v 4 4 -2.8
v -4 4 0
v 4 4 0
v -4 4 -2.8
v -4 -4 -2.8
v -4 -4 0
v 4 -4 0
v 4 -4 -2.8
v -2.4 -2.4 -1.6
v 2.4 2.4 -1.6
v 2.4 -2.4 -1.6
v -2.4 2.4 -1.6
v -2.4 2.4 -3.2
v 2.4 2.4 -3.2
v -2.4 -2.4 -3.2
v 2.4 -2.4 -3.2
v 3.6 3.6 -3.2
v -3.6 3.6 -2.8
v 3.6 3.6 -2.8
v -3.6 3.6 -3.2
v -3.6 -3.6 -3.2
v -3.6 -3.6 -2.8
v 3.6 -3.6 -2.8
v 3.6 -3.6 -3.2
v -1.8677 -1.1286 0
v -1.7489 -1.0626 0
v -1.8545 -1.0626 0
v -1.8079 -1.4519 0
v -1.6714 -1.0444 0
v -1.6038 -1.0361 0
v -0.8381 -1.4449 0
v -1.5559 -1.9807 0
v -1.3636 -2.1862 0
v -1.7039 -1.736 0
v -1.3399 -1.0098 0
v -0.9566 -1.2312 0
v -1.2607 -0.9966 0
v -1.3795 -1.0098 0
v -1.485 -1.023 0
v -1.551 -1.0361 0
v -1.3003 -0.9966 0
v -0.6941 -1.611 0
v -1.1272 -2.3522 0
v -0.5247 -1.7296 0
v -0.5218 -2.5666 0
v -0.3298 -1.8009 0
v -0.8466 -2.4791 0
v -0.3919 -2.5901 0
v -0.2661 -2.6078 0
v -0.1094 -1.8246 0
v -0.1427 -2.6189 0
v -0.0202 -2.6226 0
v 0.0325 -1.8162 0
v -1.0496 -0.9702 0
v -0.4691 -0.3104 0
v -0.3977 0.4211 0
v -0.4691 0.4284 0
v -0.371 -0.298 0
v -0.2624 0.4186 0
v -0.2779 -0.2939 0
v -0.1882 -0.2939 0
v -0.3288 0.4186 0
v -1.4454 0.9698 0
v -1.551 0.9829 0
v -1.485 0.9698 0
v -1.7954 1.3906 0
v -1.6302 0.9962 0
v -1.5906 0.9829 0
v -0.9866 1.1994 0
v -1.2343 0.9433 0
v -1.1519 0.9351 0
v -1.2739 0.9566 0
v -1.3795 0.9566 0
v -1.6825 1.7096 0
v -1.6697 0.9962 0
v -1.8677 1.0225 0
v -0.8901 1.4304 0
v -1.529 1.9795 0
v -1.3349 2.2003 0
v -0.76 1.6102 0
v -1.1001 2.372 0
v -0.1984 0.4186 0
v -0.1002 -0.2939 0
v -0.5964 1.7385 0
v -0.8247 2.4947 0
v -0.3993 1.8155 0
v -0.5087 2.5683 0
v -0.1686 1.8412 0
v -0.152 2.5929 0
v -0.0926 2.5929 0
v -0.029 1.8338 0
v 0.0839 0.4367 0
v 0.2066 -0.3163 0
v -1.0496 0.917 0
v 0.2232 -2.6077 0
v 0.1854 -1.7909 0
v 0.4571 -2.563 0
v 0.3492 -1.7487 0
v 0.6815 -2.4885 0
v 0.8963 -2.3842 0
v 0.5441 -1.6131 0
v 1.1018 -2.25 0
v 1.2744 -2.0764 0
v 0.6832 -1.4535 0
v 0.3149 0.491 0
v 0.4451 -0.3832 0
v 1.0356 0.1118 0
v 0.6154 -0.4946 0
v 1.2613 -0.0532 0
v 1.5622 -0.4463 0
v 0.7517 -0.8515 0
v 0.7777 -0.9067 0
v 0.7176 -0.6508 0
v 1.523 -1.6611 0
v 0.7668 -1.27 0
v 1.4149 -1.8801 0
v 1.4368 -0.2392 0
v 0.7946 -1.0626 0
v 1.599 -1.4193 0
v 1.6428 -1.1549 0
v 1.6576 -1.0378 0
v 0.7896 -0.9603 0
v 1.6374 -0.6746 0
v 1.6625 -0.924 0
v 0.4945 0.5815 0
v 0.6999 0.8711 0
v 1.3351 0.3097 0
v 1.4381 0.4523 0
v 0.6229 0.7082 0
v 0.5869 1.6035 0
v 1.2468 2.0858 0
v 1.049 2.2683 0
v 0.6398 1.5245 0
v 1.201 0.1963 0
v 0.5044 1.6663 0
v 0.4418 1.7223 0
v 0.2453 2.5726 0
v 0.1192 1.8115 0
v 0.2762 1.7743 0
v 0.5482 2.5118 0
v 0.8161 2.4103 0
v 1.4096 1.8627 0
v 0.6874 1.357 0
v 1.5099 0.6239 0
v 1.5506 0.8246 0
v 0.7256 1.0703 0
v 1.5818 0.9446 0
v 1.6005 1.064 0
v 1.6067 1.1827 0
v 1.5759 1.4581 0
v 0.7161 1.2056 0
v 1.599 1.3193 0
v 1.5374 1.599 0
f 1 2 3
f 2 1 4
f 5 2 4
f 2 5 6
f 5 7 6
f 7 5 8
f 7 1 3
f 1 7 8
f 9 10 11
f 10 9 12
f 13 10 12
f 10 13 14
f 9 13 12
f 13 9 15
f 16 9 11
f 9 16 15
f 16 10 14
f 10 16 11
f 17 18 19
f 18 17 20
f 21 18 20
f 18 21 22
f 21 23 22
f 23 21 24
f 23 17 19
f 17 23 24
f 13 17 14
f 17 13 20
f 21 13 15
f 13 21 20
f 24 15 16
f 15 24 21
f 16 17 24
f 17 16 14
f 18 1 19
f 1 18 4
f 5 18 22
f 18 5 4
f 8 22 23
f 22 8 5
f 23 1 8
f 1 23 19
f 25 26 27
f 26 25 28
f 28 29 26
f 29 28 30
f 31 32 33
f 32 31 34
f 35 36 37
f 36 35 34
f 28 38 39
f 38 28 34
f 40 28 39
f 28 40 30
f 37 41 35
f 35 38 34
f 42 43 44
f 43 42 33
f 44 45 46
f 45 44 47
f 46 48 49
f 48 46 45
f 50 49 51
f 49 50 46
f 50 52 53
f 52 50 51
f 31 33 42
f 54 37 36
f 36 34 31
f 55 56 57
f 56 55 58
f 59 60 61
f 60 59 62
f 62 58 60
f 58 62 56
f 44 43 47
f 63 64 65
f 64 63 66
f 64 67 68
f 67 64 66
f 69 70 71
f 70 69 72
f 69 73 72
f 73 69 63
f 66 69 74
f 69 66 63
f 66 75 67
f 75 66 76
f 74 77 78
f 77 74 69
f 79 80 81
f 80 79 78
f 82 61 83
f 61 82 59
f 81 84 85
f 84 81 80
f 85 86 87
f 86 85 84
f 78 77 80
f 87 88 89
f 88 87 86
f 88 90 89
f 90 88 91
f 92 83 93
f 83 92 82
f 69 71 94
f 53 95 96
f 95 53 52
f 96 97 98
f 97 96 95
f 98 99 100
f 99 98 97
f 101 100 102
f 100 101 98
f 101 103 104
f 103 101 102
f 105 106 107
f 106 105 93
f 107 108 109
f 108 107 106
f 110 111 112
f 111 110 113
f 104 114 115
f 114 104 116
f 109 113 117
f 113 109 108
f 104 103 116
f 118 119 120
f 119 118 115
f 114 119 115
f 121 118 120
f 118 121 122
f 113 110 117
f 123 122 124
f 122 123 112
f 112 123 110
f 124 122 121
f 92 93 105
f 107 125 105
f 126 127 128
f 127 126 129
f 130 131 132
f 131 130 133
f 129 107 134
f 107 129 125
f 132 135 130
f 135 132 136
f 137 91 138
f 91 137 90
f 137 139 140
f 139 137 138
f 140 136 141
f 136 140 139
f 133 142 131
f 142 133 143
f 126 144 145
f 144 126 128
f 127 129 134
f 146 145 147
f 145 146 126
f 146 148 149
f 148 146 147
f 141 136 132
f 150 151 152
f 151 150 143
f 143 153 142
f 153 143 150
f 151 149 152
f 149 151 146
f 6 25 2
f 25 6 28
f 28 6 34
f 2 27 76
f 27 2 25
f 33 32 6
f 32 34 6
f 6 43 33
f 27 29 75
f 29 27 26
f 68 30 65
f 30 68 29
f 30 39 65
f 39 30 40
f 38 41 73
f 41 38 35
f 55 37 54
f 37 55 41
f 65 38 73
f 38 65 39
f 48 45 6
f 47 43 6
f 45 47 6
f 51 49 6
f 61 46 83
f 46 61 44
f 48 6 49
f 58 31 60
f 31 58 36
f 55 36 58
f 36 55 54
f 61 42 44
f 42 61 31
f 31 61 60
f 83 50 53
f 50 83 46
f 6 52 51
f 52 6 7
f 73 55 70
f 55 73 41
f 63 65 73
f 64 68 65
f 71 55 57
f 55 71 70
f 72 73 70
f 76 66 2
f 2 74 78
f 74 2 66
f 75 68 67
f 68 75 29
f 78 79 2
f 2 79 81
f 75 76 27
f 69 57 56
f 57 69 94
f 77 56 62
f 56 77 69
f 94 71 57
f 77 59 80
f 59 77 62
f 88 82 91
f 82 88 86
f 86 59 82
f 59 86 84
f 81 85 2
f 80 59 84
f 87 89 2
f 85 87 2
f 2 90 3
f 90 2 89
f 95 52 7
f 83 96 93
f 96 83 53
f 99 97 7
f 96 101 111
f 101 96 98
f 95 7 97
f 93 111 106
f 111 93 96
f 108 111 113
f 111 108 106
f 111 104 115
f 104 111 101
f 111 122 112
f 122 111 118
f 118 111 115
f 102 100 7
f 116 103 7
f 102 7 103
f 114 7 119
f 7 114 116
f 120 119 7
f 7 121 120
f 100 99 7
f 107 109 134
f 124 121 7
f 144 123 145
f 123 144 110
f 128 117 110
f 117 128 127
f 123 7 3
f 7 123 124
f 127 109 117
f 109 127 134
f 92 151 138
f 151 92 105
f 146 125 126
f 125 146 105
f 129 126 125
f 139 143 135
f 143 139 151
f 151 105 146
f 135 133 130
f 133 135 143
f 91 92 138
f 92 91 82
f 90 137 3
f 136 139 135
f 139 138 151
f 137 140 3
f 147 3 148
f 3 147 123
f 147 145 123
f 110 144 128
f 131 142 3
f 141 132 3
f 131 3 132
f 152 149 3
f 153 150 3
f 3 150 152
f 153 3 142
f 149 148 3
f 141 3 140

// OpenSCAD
// file: ../p/box5.scad
use <../lib.scad>
function ldraw_lib__box5() = [
// 0 Box with 5 Faces and All Edges
// 0 Name: box5.dat
// 0 Author: James Jessiman
// 0 !LDRAW_ORG Primitive UPDATE 2012-01
// 0 !LICENSE Licensed under CC BY 2.0 and CC BY 4.0 : see CAreadme.txt
// 
// 0 BFC CERTIFY CCW
  [0,"BFC","CERTIFY"],
  [0,"BFC","CCW"],
// 
// 0 !HISTORY 2002-04-03 [sbliss] Modified for BFC compliance
// 0 !HISTORY 2002-04-25 [PTadmin] Official Update 2002-02
// 0 !HISTORY 2007-06-24 [PTadmin] Header formatted for Contributor Agreement
// 0 !HISTORY 2008-07-01 [PTadmin] Official Update 2008-01
// 0 !HISTORY 2012-02-16 [Philo] Changed to CCW
// 0 !HISTORY 2012-03-30 [PTadmin] Official Update 2012-01
// 
// 
// 2 24 1 1 1 -1 1 1
  [2,24,1,1,1,-1,1,1],
// 2 24 -1 1 1 -1 1 -1
  [2,24,-1,1,1,-1,1,-1],
// 2 24 -1 1 -1 1 1 -1
  [2,24,-1,1,-1,1,1,-1],
// 2 24 1 1 -1 1 1 1
  [2,24,1,1,-1,1,1,1],
// 2 24 1 0 1 -1 0 1
  [2,24,1,0,1,-1,0,1],
// 2 24 -1 0 1 -1 0 -1
  [2,24,-1,0,1,-1,0,-1],
// 2 24 -1 0 -1 1 0 -1
  [2,24,-1,0,-1,1,0,-1],
// 2 24 1 0 -1 1 0 1
  [2,24,1,0,-1,1,0,1],
// 2 24 1 0 1 1 1 1
  [2,24,1,0,1,1,1,1],
// 2 24 -1 0 1 -1 1 1
  [2,24,-1,0,1,-1,1,1],
// 2 24 1 0 -1 1 1 -1
  [2,24,1,0,-1,1,1,-1],
// 2 24 -1 0 -1 -1 1 -1
  [2,24,-1,0,-1,-1,1,-1],
// 4 16 -1 1 1 1 1 1 1 1 -1 -1 1 -1
  [4,16,-1,1,1,1,1,1,1,1,-1,-1,1,-1],
// 4 16 -1 1 1 -1 0 1 1 0 1 1 1 1
  [4,16,-1,1,1,-1,0,1,1,0,1,1,1,1],
// 4 16 -1 1 -1 -1 0 -1 -1 0 1 -1 1 1
  [4,16,-1,1,-1,-1,0,-1,-1,0,1,-1,1,1],
// 4 16 1 1 -1 1 0 -1 -1 0 -1 -1 1 -1
  [4,16,1,1,-1,1,0,-1,-1,0,-1,-1,1,-1],
// 4 16 1 1 1 1 0 1 1 0 -1 1 1 -1
  [4,16,1,1,1,1,0,1,1,0,-1,1,1,-1],
];
makepoly(ldraw_lib__box5(), line=0.2);
// file: ../p/box4.scad
use <../lib.scad>
function ldraw_lib__box4() = [
// 0 Box with 4 Faces (2 Parallel Pairs) and All Edges
// 0 Name: box4.dat
// 0 Author: James Jessiman
// 0 !LDRAW_ORG Primitive UPDATE 2012-01
// 0 !LICENSE Licensed under CC BY 2.0 and CC BY 4.0 : see CAreadme.txt
// 
// 0 BFC CERTIFY CCW
  [0,"BFC","CERTIFY"],
  [0,"BFC","CCW"],
// 
// 0 !HISTORY 2002-04-03 [sbliss] Modified for BFC compliance
// 0 !HISTORY 2002-04-25 [PTadmin] Official Update 2002-02
// 0 !HISTORY 2007-06-24 [PTadmin] Header formatted for Contributor Agreement
// 0 !HISTORY 2008-07-01 [PTadmin] Official Update 2008-01
// 0 !HISTORY 2012-02-16 [Philo] Changed to CCW
// 0 !HISTORY 2012-03-30 [PTadmin] Official Update 2012-01
// 
// 
// 2 24 1 1 1 -1 1 1
  [2,24,1,1,1,-1,1,1],
// 2 24 -1 1 1 -1 1 -1
  [2,24,-1,1,1,-1,1,-1],
// 2 24 -1 1 -1 1 1 -1
  [2,24,-1,1,-1,1,1,-1],
// 2 24 1 1 -1 1 1 1
  [2,24,1,1,-1,1,1,1],
// 2 24 1 0 1 -1 0 1
  [2,24,1,0,1,-1,0,1],
// 2 24 -1 0 1 -1 0 -1
  [2,24,-1,0,1,-1,0,-1],
// 2 24 -1 0 -1 1 0 -1
  [2,24,-1,0,-1,1,0,-1],
// 2 24 1 0 -1 1 0 1
  [2,24,1,0,-1,1,0,1],
// 2 24 1 0 1 1 1 1
  [2,24,1,0,1,1,1,1],
// 2 24 -1 0 1 -1 1 1
  [2,24,-1,0,1,-1,1,1],
// 2 24 1 0 -1 1 1 -1
  [2,24,1,0,-1,1,1,-1],
// 2 24 -1 0 -1 -1 1 -1
  [2,24,-1,0,-1,-1,1,-1],
// 4 16 -1 1 1 -1 0 1 1 0 1 1 1 1
  [4,16,-1,1,1,-1,0,1,1,0,1,1,1,1],
// 4 16 -1 1 -1 -1 0 -1 -1 0 1 -1 1 1
  [4,16,-1,1,-1,-1,0,-1,-1,0,1,-1,1,1],
// 4 16 1 1 -1 1 0 -1 -1 0 -1 -1 1 -1
  [4,16,1,1,-1,1,0,-1,-1,0,-1,-1,1,-1],
// 4 16 1 1 1 1 0 1 1 0 -1 1 1 -1
  [4,16,1,1,1,1,0,1,1,0,-1,1,1,-1],
];
makepoly(ldraw_lib__box4(), line=0.2);
// file: s/3070bs01.scad
use <../../lib.scad>
use <../../p/box4.scad>
use <../../p/box5.scad>
function ldraw_lib__s__3070bs01() = [
// 0 ~Tile  1 x  1 with Groove without Top Face
// 0 Name: s\3070bs01.dat
// 0 Author: Chris Dee [cwdee]
// 0 !LDRAW_ORG Subpart UPDATE 2009-02
// 0 !LICENSE Licensed under CC BY 2.0 and CC BY 4.0 : see CAreadme.txt
// 
// 0 BFC CERTIFY CCW
  [0,"BFC","CERTIFY"],
  [0,"BFC","CCW"],
// 
// 0 !HISTORY 2009-09-03 [PTadmin] Official Update 2009-02
// 
// 
// 1 16 0 0 0 10 0 0 0 7 0 0 0 10 box4.dat
  [1,16,0,0,0,10,0,0,0,7,0,0,0,10, ldraw_lib__box4()],
// 0 BFC INVERTNEXT
  [0,"BFC","INVERTNEXT"],
// 1 16 0 8 0 6 0 0 0 -4 0 0 0 6 box5.dat
  [1,16,0,8,0,6,0,0,0,-4,0,0,0,6, ldraw_lib__box5()],
// 1 16 0 7 0 9 0 0 0 1 0 0 0 9 box4.dat
  [1,16,0,7,0,9,0,0,0,1,0,0,0,9, ldraw_lib__box4()],
// 
// 4 16 9 8 9 6 8 6 -6 8 6 -9 8 9
  [4,16,9,8,9,6,8,6,-6,8,6,-9,8,9],
// 4 16 -9 8 9 -6 8 6 -6 8 -6 -9 8 -9
  [4,16,-9,8,9,-6,8,6,-6,8,-6,-9,8,-9],
// 4 16 -9 8 -9 -6 8 -6 6 8 -6 9 8 -9
  [4,16,-9,8,-9,-6,8,-6,6,8,-6,9,8,-9],
// 4 16 9 8 -9 6 8 -6 6 8 6 9 8 9
  [4,16,9,8,-9,6,8,-6,6,8,6,9,8,9],
// 
// 4 16 10 7 10 9 7 9 -9 7 9 -10 7 10
  [4,16,10,7,10,9,7,9,-9,7,9,-10,7,10],
// 4 16 -10 7 10 -9 7 9 -9 7 -9 -10 7 -10
  [4,16,-10,7,10,-9,7,9,-9,7,-9,-10,7,-10],
// 4 16 -10 7 -10 -9 7 -9 9 7 -9 10 7 -10
  [4,16,-10,7,-10,-9,7,-9,9,7,-9,10,7,-10],
// 4 16 10 7 -10 9 7 -9 9 7 9 10 7 10
  [4,16,10,7,-10,9,7,-9,9,7,9,10,7,10],
// 0
];
makepoly(ldraw_lib__s__3070bs01(), line=0.2);
// main file
use <../lib.scad>
use <s/3070bs01.scad>
function ldraw_lib__3070bp03() = [
// 0 Tile  1 x  1 with Black "3" Pattern
// 0 Name: 3070bp03.dat
// 0 Author: John Riley [jriley]
// 0 !LDRAW_ORG Part UPDATE 2009-03
// 0 !LICENSE Licensed under CC BY 2.0 and CC BY 4.0 : see CAreadme.txt
// 
// 0 BFC CERTIFY CCW
  [0,"BFC","CERTIFY"],
  [0,"BFC","CCW"],
// 
// 0 !HISTORY 2004-03-02 [PTadmin] Official Update 2004-01
// 0 !HISTORY 2007-10-13 [PTadmin] Header formatted for Contributor Agreement
// 0 !HISTORY 2008-07-01 [PTadmin] Official Update 2008-01
// 0 !HISTORY 2009-08-12 [anathema] Improved pattern
// 0 !HISTORY 2009-12-29 [PTadmin] Official Update 2009-03
// 
// 
// 1 16 0 0 0 1 0 0 0 1 0 0 0 1 s\3070bs01.dat
  [1,16,0,0,0,1,0,0,0,1,0,0,0,1, ldraw_lib__s__3070bs01()],
// 4 0 -4.66925 0 -2.82141 -4.51972 0 -3.62986 -4.37228 0 -2.65649 -4.63619 0 -2.65649
  [4,0,-4.66925,0,-2.82141,-4.51972,0,-3.62986,-4.37228,0,-2.65649,-4.63619,0,-2.65649],
// 4 0 -4.17848 0 -2.61108 -4.37228 0 -2.65649 -4.51972 0 -3.62986 -4.00938 0 -2.59037
  [4,0,-4.17848,0,-2.61108,-4.37228,0,-2.65649,-4.51972,0,-3.62986,-4.00938,0,-2.59037],
// 4 0 -2.09532 0 -3.61219 -4.2598 0 -4.33989 -3.88968 0 -4.95169 -3.40898 0 -5.46545
  [4,0,-2.09532,0,-3.61219,-4.2598,0,-4.33989,-3.88968,0,-4.95169,-3.40898,0,-5.46545],
// 4 0 -3.3497 0 -2.52444 -4.2598 0 -4.33989 -2.39153 0 -3.0781 -3.15172 0 -2.49138
  [4,0,-3.3497,0,-2.52444,-4.2598,0,-4.33989,-2.39153,0,-3.0781,-3.15172,0,-2.49138],
// 4 0 -4.51972 0 -3.62986 -4.2598 0 -4.33989 -3.44869 0 -2.52444 -3.7126 0 -2.5575
  [4,0,-4.51972,0,-3.62986,-4.2598,0,-4.33989,-3.44869,0,-2.52444,-3.7126,0,-2.5575],
// 3 0 -3.87752 0 -2.59037 -4.51972 0 -3.62986 -3.7126 0 -2.5575
  [3,0,-3.87752,0,-2.59037,-4.51972,0,-3.62986,-3.7126,0,-2.5575],
// 3 0 -4.51972 0 -3.62986 -3.87752 0 -2.59037 -4.00938 0 -2.59037
  [3,0,-4.51972,0,-3.62986,-3.87752,0,-2.59037,-4.00938,0,-2.59037],
// 3 0 -3.15172 0 -2.49138 -3.25071 0 -2.49138 -3.3497 0 -2.52444
  [3,0,-3.15172,0,-2.49138,-3.25071,0,-2.49138,-3.3497,0,-2.52444],
// 3 0 -3.3497 0 -2.52444 -3.44869 0 -2.52444 -4.2598 0 -4.33989
  [3,0,-3.3497,0,-2.52444,-3.44869,0,-2.52444,-4.2598,0,-4.33989],
// 4 0 -1.73527 0 -4.02753 -3.40898 0 -5.46545 -2.81789 0 -5.8806 -1.31176 0 -4.32412
  [4,0,-1.73527,0,-4.02753,-3.40898,0,-5.46545,-2.81789,0,-5.8806,-1.31176,0,-4.32412],
// 4 0 -1.30454 0 -6.4164 -0.82441 0 -4.50215 -1.31176 0 -4.32412 -2.11641 0 -6.19771
  [4,0,-1.30454,0,-6.4164,-0.82441,0,-4.50215,-1.31176,0,-4.32412,-2.11641,0,-6.19771],
// 4 0 -0.82441 0 -4.50215 -1.30454 0 -6.4164 -0.97964 0 -6.4753 -0.66519 0 -6.51957
  [4,0,-0.82441,0,-4.50215,-1.30454,0,-6.4164,-0.97964,0,-6.4753,-0.66519,0,-6.51957],
// 4 0 -0.66519 0 -6.51957 -0.35682 0 -6.54731 -0.27341 0 -4.56162 -0.82441 0 -4.50215
  [4,0,-0.66519,0,-6.51957,-0.35682,0,-6.54731,-0.27341,0,-4.56162,-0.82441,0,-4.50215],
// 4 0 -0.27341 0 -4.56162 -0.35682 0 -6.54731 -0.05054 0 -6.55662 0.08132 0 -4.54053
  [4,0,-0.27341,0,-4.56162,-0.35682,0,-6.54731,-0.05054,0,-6.55662,0.08132,0,-4.54053],
// 3 0 -2.09532 0 -3.61219 -3.40898 0 -5.46545 -1.73527 0 -4.02753
  [3,0,-2.09532,0,-3.61219,-3.40898,0,-5.46545,-1.73527,0,-4.02753],
// 3 0 -2.6239 0 -2.42545 -3.15172 0 -2.49138 -2.39153 0 -3.0781
  [3,0,-2.6239,0,-2.42545,-3.15172,0,-2.49138,-2.39153,0,-3.0781],
// 3 0 -2.39153 0 -3.0781 -4.2598 0 -4.33989 -2.09532 0 -3.61219
  [3,0,-2.39153,0,-3.0781,-4.2598,0,-4.33989,-2.09532,0,-3.61219],
// 4 0 -1.17268 0 -0.77606 -0.92739 0 -0.74509 -0.99427 0 1.05269 -1.17268 0 1.07112
  [4,0,-1.17268,0,-0.77606,-0.92739,0,-0.74509,-0.99427,0,1.05269,-1.17268,0,1.07112],
// 4 0 -0.69464 0 -0.73483 -0.47044 0 -0.73483 -0.65607 0 1.04642 -0.82194 0 1.04642
  [4,0,-0.69464,0,-0.73483,-0.47044,0,-0.73483,-0.65607,0,1.04642,-0.82194,0,1.04642],
// 4 0 -0.92739 0 -0.74509 -0.69464 0 -0.73483 -0.82194 0 1.04642 -0.99427 0 1.05269
  [4,0,-0.92739,0,-0.74509,-0.69464,0,-0.73483,-0.82194,0,1.04642,-0.99427,0,1.05269],
// 3 0 -1.31176 0 -4.32412 -2.81789 0 -5.8806 -2.11641 0 -6.19771
  [3,0,-1.31176,0,-4.32412,-2.81789,0,-5.8806,-2.11641,0,-6.19771],
// 4 0 -3.87752 0 2.45736 -3.7126 0 2.42449 -3.61361 0 2.42449 -4.48856 0 3.47652
  [4,0,-3.87752,0,2.45736,-3.7126,0,2.42449,-3.61361,0,2.42449,-4.48856,0,3.47652],
// 4 0 -4.0755 0 2.49042 -3.97651 0 2.45736 -3.87752 0 2.45736 -4.48856 0 3.47652
  [4,0,-4.0755,0,2.49042,-3.97651,0,2.45736,-3.87752,0,2.45736,-4.48856,0,3.47652],
// 4 0 -2.46658 0 2.99848 -3.18478 0 2.39143 -3.08579 0 2.35837 -2.87964 0 2.33785
  [4,0,-2.46658,0,2.99848,-3.18478,0,2.39143,-3.08579,0,2.35837,-2.87964,0,2.33785],
// 4 0 -2.46658 0 2.99848 -3.61361 0 2.42449 -3.44869 0 2.39143 -3.18478 0 2.39143
  [4,0,-2.46658,0,2.99848,-3.61361,0,2.42449,-3.44869,0,2.39143,-3.18478,0,2.39143],
// 4 0 -4.48856 0 3.47652 -3.61361 0 2.42449 -2.46658 0 2.99848 -4.20622 0 4.27395
  [4,0,-4.48856,0,3.47652,-3.61361,0,2.42449,-2.46658,0,2.99848,-4.20622,0,4.27395],
// 4 0 -4.48856 0 3.47652 -4.66925 0 2.55635 -4.1743 0 2.49042 -4.0755 0 2.49042
  [4,0,-4.48856,0,3.47652,-4.66925,0,2.55635,-4.1743,0,2.49042,-4.0755,0,2.49042],
// 4 0 -2.22528 0 3.57608 -3.82242 0 4.94864 -4.20622 0 4.27395 -2.46658 0 2.99848
  [4,0,-2.22528,0,3.57608,-3.82242,0,4.94864,-4.20622,0,4.27395,-2.46658,0,2.99848],
// 4 0 -3.33716 0 5.50078 -3.82242 0 4.94864 -1.9 0 4.02543 -2.75025 0 5.92999
  [4,0,-3.33716,0,5.50078,-3.82242,0,4.94864,-1.9,0,4.02543,-2.75025,0,5.92999],
// 4 0 -0.49609 0 1.04642 -0.65607 0 1.04642 -0.47044 0 -0.73483 -0.25042 0 -0.73483
  [4,0,-0.49609,0,1.04642,-0.65607,0,1.04642,-0.47044,0,-0.73483,-0.25042,0,-0.73483],
// 4 0 -2.75025 0 5.92999 -1.9 0 4.02543 -1.49112 0 4.34634 -2.06169 0 6.23684
  [4,0,-2.75025,0,5.92999,-1.9,0,4.02543,-1.49112,0,4.34634,-2.06169,0,6.23684],
// 4 0 -2.06169 0 6.23684 -1.49112 0 4.34634 -0.99826 0 4.53881 -1.27167 0 6.42076
  [4,0,-2.06169,0,6.23684,-1.49112,0,4.34634,-0.99826,0,4.53881,-1.27167,0,6.42076],
// 3 0 -3.82242 0 4.94864 -2.22528 0 3.57608 -1.9 0 4.02543
  [3,0,-3.82242,0,4.94864,-2.22528,0,3.57608,-1.9,0,4.02543],
// 4 0 -1.27167 0 6.42076 -0.99826 0 4.53881 -0.42161 0 4.60303 -0.38 0 6.48213
  [4,0,-1.27167,0,6.42076,-0.99826,0,4.53881,-0.42161,0,4.60303,-0.38,0,6.48213],
// 4 0 -0.23142 0 6.48213 -0.38 0 6.48213 -0.42161 0 4.60303 -0.07258 0 4.58441
  [4,0,-0.23142,0,6.48213,-0.38,0,6.48213,-0.42161,0,4.60303,-0.07258,0,4.58441],
// 4 0 0.20976 0 1.09164 -0.49609 0 1.04642 -0.25042 0 -0.73483 0.51642 0 -0.79069
  [4,0,0.20976,0,1.09164,-0.49609,0,1.04642,-0.25042,0,-0.73483,0.51642,0,-0.79069],
// 3 0 -2.46658 0 2.99848 -2.87964 0 2.33785 -2.6239 0 2.29244
  [3,0,-2.46658,0,2.99848,-2.87964,0,2.33785,-2.6239,0,2.29244],
// 4 0 0.08132 0 -4.54053 -0.05054 0 -6.55662 0.55803 0 -6.51919 0.46341 0 -4.47726
  [4,0,0.08132,0,-4.54053,-0.05054,0,-6.55662,0.55803,0,-6.51919,0.46341,0,-4.47726],
// 4 0 0.46341 0 -4.47726 0.55803 0 -6.51919 1.14266 0 -6.40747 0.87305 0 -4.37181
  [4,0,0.46341,0,-4.47726,0.55803,0,-6.51919,1.14266,0,-6.40747,0.87305,0,-4.37181],
// 4 0 0.87305 0 -4.37181 1.14266 0 -6.40747 1.70373 0 -6.22127 2.24086 0 -5.9604
  [4,0,0.87305,0,-4.37181,1.14266,0,-6.40747,1.70373,0,-6.22127,2.24086,0,-5.9604],
// 4 0 1.36021 0 -4.03285 0.87305 0 -4.37181 2.24086 0 -5.9604 2.75443 0 -5.62505
  [4,0,1.36021,0,-4.03285,0.87305,0,-4.37181,2.24086,0,-5.9604,2.75443,0,-5.62505],
// 4 0 3.18611 0 -5.19109 1.7081 0 -3.63385 1.36021 0 -4.03285 2.75443 0 -5.62505
  [4,0,3.18611,0,-5.19109,1.7081,0,-3.63385,1.36021,0,-4.03285,2.75443,0,-5.62505],
// 4 0 0.78717 0 1.22749 0.51642 0 -0.79069 1.11264 0 -0.95789 2.58894 0 0.27939
  [4,0,0.78717,0,1.22749,0.51642,0,-0.79069,1.11264,0,-0.95789,2.58894,0,0.27939],
// 4 0 2.58894 0 0.27939 1.11264 0 -0.95789 1.53843 0 -1.23662 3.15324 0 -0.13291
  [4,0,2.58894,0,0.27939,1.11264,0,-0.95789,1.53843,0,-1.23662,3.15324,0,-0.13291],
// 4 0 3.90545 0 -1.11578 1.79398 0 -1.62688 1.87929 0 -2.12867 1.94427 0 -2.2668
  [4,0,3.90545,0,-1.11578,1.79398,0,-1.62688,1.87929,0,-2.12867,1.94427,0,-2.2668],
// 4 0 3.8076 0 -4.15274 1.91691 0 -3.175 1.7081 0 -3.63385 3.53723 0 -4.70032
  [4,0,3.8076,0,-4.15274,1.91691,0,-3.175,1.7081,0,-3.63385,3.53723,0,-4.70032],
// 4 0 3.15324 0 -0.13291 1.53843 0 -1.23662 1.79398 0 -1.62688 3.59195 0 -0.59803
  [4,0,3.15324,0,-0.13291,1.53843,0,-1.23662,1.79398,0,-1.62688,3.59195,0,-0.59803],
// 3 0 1.7081 0 -3.63385 3.18611 0 -5.19109 3.53723 0 -4.70032
  [3,0,1.7081,0,-3.63385,3.18611,0,-5.19109,3.53723,0,-4.70032],
// 4 0 1.98645 0 -2.65649 1.91691 0 -3.175 3.9976 0 -3.54835 4.10704 0 -2.88734
  [4,0,1.98645,0,-2.65649,1.91691,0,-3.175,3.9976,0,-3.54835,4.10704,0,-2.88734],
// 3 0 3.8076 0 -4.15274 3.9976 0 -3.54835 1.91691 0 -3.175
  [3,0,3.8076,0,-4.15274,3.9976,0,-3.54835,1.91691,0,-3.175],
// 4 0 1.98645 0 -2.65649 4.10704 0 -2.88734 4.1439 0 -2.59455 1.9741 0 -2.40075
  [4,0,1.98645,0,-2.65649,4.10704,0,-2.88734,4.1439,0,-2.59455,1.9741,0,-2.40075],
// 3 0 1.79398 0 -1.62688 3.90545 0 -1.11578 3.59195 0 -0.59803
  [3,0,1.79398,0,-1.62688,3.90545,0,-1.11578,3.59195,0,-0.59803],
// 4 0 4.09355 0 -1.68654 1.94427 0 -2.2668 1.9741 0 -2.40075 4.15625 0 -2.31012
  [4,0,4.09355,0,-1.68654,1.94427,0,-2.2668,1.9741,0,-2.40075,4.15625,0,-2.31012],
// 3 0 1.94427 0 -2.2668 4.09355 0 -1.68654 3.90545 0 -1.11578
  [3,0,1.94427,0,-2.2668,4.09355,0,-1.68654,3.90545,0,-1.11578],
// 3 0 4.15625 0 -2.31012 1.9741 0 -2.40075 4.1439 0 -2.59455
  [3,0,4.15625,0,-2.31012,1.9741,0,-2.40075,4.1439,0,-2.59455],
// 3 0 0.20976 0 1.09164 0.51642 0 -0.79069 0.78717 0 1.22749
  [3,0,0.20976,0,1.09164,0.51642,0,-0.79069,0.78717,0,1.22749],
// 3 0 2.58894 0 0.27939 1.23633 0 1.45378 0.78717 0 1.22749
  [3,0,2.58894,0,0.27939,1.23633,0,1.45378,0.78717,0,1.22749],
// 4 0 1.74971 0 2.17787 1.55724 0 1.77051 3.33773 0 0.77434 3.59518 0 1.13078
  [4,0,1.74971,0,2.17787,1.55724,0,1.77051,3.33773,0,0.77434,3.59518,0,1.13078],
// 4 0 1.46737 0 4.00871 1.59942 0 3.8113 3.11695 0 5.21445 2.62238 0 5.67083
  [4,0,1.46737,0,4.00871,1.59942,0,3.8113,3.11695,0,5.21445,2.62238,0,5.67083],
// 4 0 1.55724 0 1.77051 1.23633 0 1.45378 2.58894 0 0.27939 3.00238 0 0.49067
  [4,0,1.55724,0,1.77051,1.23633,0,1.45378,2.58894,0,0.27939,3.00238,0,0.49067],
// 4 0 1.26103 0 4.16565 1.46737 0 4.00871 2.62238 0 5.67083 1.10447 0 4.30587
  [4,0,1.26103,0,4.16565,1.46737,0,4.00871,2.62238,0,5.67083,1.10447,0,4.30587],
// 4 0 -0.07258 0 4.58441 0.29811 0 4.52874 0.61332 0 6.4314 -0.23142 0 6.48213
  [4,0,-0.07258,0,4.58441,0.29811,0,4.52874,0.61332,0,6.4314,-0.23142,0,6.48213],
// 4 0 0.61332 0 6.4314 0.29811 0 4.52874 0.69046 0 4.43583 1.37047 0 6.2794
  [4,0,0.61332,0,6.4314,0.29811,0,4.52874,0.69046,0,4.43583,1.37047,0,6.2794],
// 4 0 1.10447 0 4.30587 2.04022 0 6.02575 1.37047 0 6.2794 0.69046 0 4.43583
  [4,0,1.10447,0,4.30587,2.04022,0,6.02575,1.37047,0,6.2794,0.69046,0,4.43583],
// 4 0 1.59942 0 3.8113 1.71855 0 3.39254 3.52393 0 4.6568 3.11695 0 5.21445
  [4,0,1.59942,0,3.8113,1.71855,0,3.39254,3.52393,0,4.6568,3.11695,0,5.21445],
// 4 0 3.77473 0 1.5598 3.87638 0 2.0614 1.74971 0 2.17787 3.59518 0 1.13078
  [4,0,3.77473,0,1.5598,3.87638,0,2.0614,1.74971,0,2.17787,3.59518,0,1.13078],
// 3 0 3.33773 0 0.77434 1.55724 0 1.77051 3.00238 0 0.49067
  [3,0,3.33773,0,0.77434,1.55724,0,1.77051,3.00238,0,0.49067],
// 4 0 1.81393 0 2.67567 1.74971 0 2.17787 3.87638 0 2.0614 3.95447 0 2.3616
  [4,0,1.81393,0,2.67567,1.74971,0,2.17787,3.87638,0,2.0614,3.95447,0,2.3616],
// 4 0 1.81393 0 2.67567 3.95447 0 2.3616 4.00121 0 2.66009 4.01679 0 2.95687
  [4,0,1.81393,0,2.67567,3.95447,0,2.3616,4.00121,0,2.66009,4.01679,0,2.95687],
// 3 0 2.04022 0 6.02575 1.10447 0 4.30587 2.62238 0 5.67083
  [3,0,2.04022,0,6.02575,1.10447,0,4.30587,2.62238,0,5.67083],
// 4 0 3.93965 0 3.64524 1.71855 0 3.39254 1.79018 0 3.01406 3.99741 0 3.2983
  [4,0,3.93965,0,3.64524,1.71855,0,3.39254,1.79018,0,3.01406,3.99741,0,3.2983],
// 4 0 3.84351 0 3.9975 3.52393 0 4.6568 1.71855 0 3.39254 3.93965 0 3.64524
  [4,0,3.84351,0,3.9975,3.52393,0,4.6568,1.71855,0,3.39254,3.93965,0,3.64524],
// 4 0 4.01679 0 2.95687 3.99741 0 3.2983 1.79018 0 3.01406 1.81393 0 2.67567
  [4,0,4.01679,0,2.95687,3.99741,0,3.2983,1.79018,0,3.01406,1.81393,0,2.67567],
// 4 16 -10 0 -10 -4.51972 0 -3.62986 -4.66925 0 -2.82141 -10 0 10
  [4,16,-10,0,-10,-4.51972,0,-3.62986,-4.66925,0,-2.82141,-10,0,10],
// 3 16 -4.51972 0 -3.62986 -10 0 -10 -4.2598 0 -4.33989
  [3,16,-4.51972,0,-3.62986,-10,0,-10,-4.2598,0,-4.33989],
// 4 16 -10 0 10 -4.66925 0 -2.82141 -4.63619 0 -2.65649 -4.66925 0 2.55635
  [4,16,-10,0,10,-4.66925,0,-2.82141,-4.63619,0,-2.65649,-4.66925,0,2.55635],
// 3 16 -3.40898 0 -5.46545 -3.88968 0 -4.95169 -10 0 -10
  [3,16,-3.40898,0,-5.46545,-3.88968,0,-4.95169,-10,0,-10],
// 3 16 -3.88968 0 -4.95169 -4.2598 0 -4.33989 -10 0 -10
  [3,16,-3.88968,0,-4.95169,-4.2598,0,-4.33989,-10,0,-10],
// 3 16 -10 0 -10 -2.81789 0 -5.8806 -3.40898 0 -5.46545
  [3,16,-10,0,-10,-2.81789,0,-5.8806,-3.40898,0,-5.46545],
// 4 16 -4.63619 0 -2.65649 -4.37228 0 -2.65649 -4.17848 0 -2.61108 -4.1743 0 2.49042
  [4,16,-4.63619,0,-2.65649,-4.37228,0,-2.65649,-4.17848,0,-2.61108,-4.1743,0,2.49042],
// 4 16 -3.97651 0 2.45736 -4.17848 0 -2.61108 -4.00938 0 -2.59037 -3.7126 0 2.42449
  [4,16,-3.97651,0,2.45736,-4.17848,0,-2.61108,-4.00938,0,-2.59037,-3.7126,0,2.42449],
// 4 16 -4.00938 0 -2.59037 -3.87752 0 -2.59037 -3.7126 0 -2.5575 -3.7126 0 2.42449
  [4,16,-4.00938,0,-2.59037,-3.87752,0,-2.59037,-3.7126,0,-2.5575,-3.7126,0,2.42449],
// 4 16 -3.44869 0 -2.52444 -3.3497 0 -2.52444 -3.25071 0 -2.49138 -3.44869 0 2.39143
  [4,16,-3.44869,0,-2.52444,-3.3497,0,-2.52444,-3.25071,0,-2.49138,-3.44869,0,2.39143],
// 4 16 -1.17268 0 -0.77606 -3.25071 0 -2.49138 -3.15172 0 -2.49138 -2.6239 0 -2.42545
  [4,16,-1.17268,0,-0.77606,-3.25071,0,-2.49138,-3.15172,0,-2.49138,-2.6239,0,-2.42545],
// 4 16 -3.7126 0 2.42449 -3.7126 0 -2.5575 -3.44869 0 -2.52444 -3.44869 0 2.39143
  [4,16,-3.7126,0,2.42449,-3.7126,0,-2.5575,-3.44869,0,-2.52444,-3.44869,0,2.39143],
// 3 16 -0.97964 0 -6.4753 -1.30454 0 -6.4164 -10 0 -10
  [3,16,-0.97964,0,-6.4753,-1.30454,0,-6.4164,-10,0,-10],
// 3 16 -2.11641 0 -6.19771 -2.81789 0 -5.8806 -10 0 -10
  [3,16,-2.11641,0,-6.19771,-2.81789,0,-5.8806,-10,0,-10],
// 3 16 -1.30454 0 -6.4164 -2.11641 0 -6.19771 -10 0 -10
  [3,16,-1.30454,0,-6.4164,-2.11641,0,-6.19771,-10,0,-10],
// 3 16 -0.35682 0 -6.54731 -0.66519 0 -6.51957 -10 0 -10
  [3,16,-0.35682,0,-6.54731,-0.66519,0,-6.51957,-10,0,-10],
// 4 16 -0.82441 0 -4.50215 -0.25042 0 -0.73483 -0.47044 0 -0.73483 -1.31176 0 -4.32412
  [4,16,-0.82441,0,-4.50215,-0.25042,0,-0.73483,-0.47044,0,-0.73483,-1.31176,0,-4.32412],
// 3 16 -0.97964 0 -6.4753 -10 0 -10 -0.66519 0 -6.51957
  [3,16,-0.97964,0,-6.4753,-10,0,-10,-0.66519,0,-6.51957],
// 4 16 -2.39153 0 -3.0781 -2.09532 0 -3.61219 -0.69464 0 -0.73483 -0.92739 0 -0.74509
  [4,16,-2.39153,0,-3.0781,-2.09532,0,-3.61219,-0.69464,0,-0.73483,-0.92739,0,-0.74509],
// 4 16 -1.17268 0 -0.77606 -2.6239 0 -2.42545 -2.39153 0 -3.0781 -0.92739 0 -0.74509
  [4,16,-1.17268,0,-0.77606,-2.6239,0,-2.42545,-2.39153,0,-3.0781,-0.92739,0,-0.74509],
// 4 16 -0.47044 0 -0.73483 -2.09532 0 -3.61219 -1.73527 0 -4.02753 -1.31176 0 -4.32412
  [4,16,-0.47044,0,-0.73483,-2.09532,0,-3.61219,-1.73527,0,-4.02753,-1.31176,0,-4.32412],
// 3 16 -2.09532 0 -3.61219 -0.47044 0 -0.73483 -0.69464 0 -0.73483
  [3,16,-2.09532,0,-3.61219,-0.47044,0,-0.73483,-0.69464,0,-0.73483],
// 4 16 -0.25042 0 -0.73483 -0.82441 0 -4.50215 -0.27341 0 -4.56162 0.08132 0 -4.54053
  [4,16,-0.25042,0,-0.73483,-0.82441,0,-4.50215,-0.27341,0,-4.56162,0.08132,0,-4.54053],
// 4 16 -0.05054 0 -6.55662 -0.35682 0 -6.54731 -10 0 -10 10 0 -10
  [4,16,-0.05054,0,-6.55662,-0.35682,0,-6.54731,-10,0,-10,10,0,-10],
// 4 16 -3.44869 0 2.39143 -3.25071 0 -2.49138 -1.17268 0 -0.77606 -3.08579 0 2.35837
  [4,16,-3.44869,0,2.39143,-3.25071,0,-2.49138,-1.17268,0,-0.77606,-3.08579,0,2.35837],
// 3 16 -3.61361 0 2.42449 -3.7126 0 2.42449 -3.44869 0 2.39143
  [3,16,-3.61361,0,2.42449,-3.7126,0,2.42449,-3.44869,0,2.39143],
// 3 16 -3.87752 0 2.45736 -3.97651 0 2.45736 -3.7126 0 2.42449
  [3,16,-3.87752,0,2.45736,-3.97651,0,2.45736,-3.7126,0,2.42449],
// 4 16 -2.87964 0 2.33785 -3.08579 0 2.35837 -1.17268 0 -0.77606 -1.17268 0 1.07112
  [4,16,-2.87964,0,2.33785,-3.08579,0,2.35837,-1.17268,0,-0.77606,-1.17268,0,1.07112],
// 3 16 -3.18478 0 2.39143 -3.44869 0 2.39143 -3.08579 0 2.35837
  [3,16,-3.18478,0,2.39143,-3.44869,0,2.39143,-3.08579,0,2.35837],
// 3 16 -4.66925 0 2.55635 -4.48856 0 3.47652 -10 0 10
  [3,16,-4.66925,0,2.55635,-4.48856,0,3.47652,-10,0,10],
// 3 16 -10 0 10 -4.20622 0 4.27395 -3.82242 0 4.94864
  [3,16,-10,0,10,-4.20622,0,4.27395,-3.82242,0,4.94864],
// 3 16 -4.20622 0 4.27395 -10 0 10 -4.48856 0 3.47652
  [3,16,-4.20622,0,4.27395,-10,0,10,-4.48856,0,3.47652],
// 4 16 -3.97651 0 2.45736 -4.0755 0 2.49042 -4.1743 0 2.49042 -4.17848 0 -2.61108
  [4,16,-3.97651,0,2.45736,-4.0755,0,2.49042,-4.1743,0,2.49042,-4.17848,0,-2.61108],
// 3 16 -3.82242 0 4.94864 -3.33716 0 5.50078 -10 0 10
  [3,16,-3.82242,0,4.94864,-3.33716,0,5.50078,-10,0,10],
// 3 16 -10 0 10 -3.33716 0 5.50078 -2.75025 0 5.92999
  [3,16,-10,0,10,-3.33716,0,5.50078,-2.75025,0,5.92999],
// 3 16 -4.1743 0 2.49042 -4.66925 0 2.55635 -4.63619 0 -2.65649
  [3,16,-4.1743,0,2.49042,-4.66925,0,2.55635,-4.63619,0,-2.65649],
// 4 16 -1.17268 0 1.07112 -0.99427 0 1.05269 -2.46658 0 2.99848 -2.6239 0 2.29244
  [4,16,-1.17268,0,1.07112,-0.99427,0,1.05269,-2.46658,0,2.99848,-2.6239,0,2.29244],
// 4 16 -2.22528 0 3.57608 -2.46658 0 2.99848 -0.99427 0 1.05269 -0.82194 0 1.04642
  [4,16,-2.22528,0,3.57608,-2.46658,0,2.99848,-0.99427,0,1.05269,-0.82194,0,1.04642],
// 3 16 -2.6239 0 2.29244 -2.87964 0 2.33785 -1.17268 0 1.07112
  [3,16,-2.6239,0,2.29244,-2.87964,0,2.33785,-1.17268,0,1.07112],
// 4 16 -2.22528 0 3.57608 -0.82194 0 1.04642 -0.65607 0 1.04642 -1.9 0 4.02543
  [4,16,-2.22528,0,3.57608,-0.82194,0,1.04642,-0.65607,0,1.04642,-1.9,0,4.02543],
// 4 16 -0.49609 0 1.04642 -0.07258 0 4.58441 -0.42161 0 4.60303 -0.99826 0 4.53881
  [4,16,-0.49609,0,1.04642,-0.07258,0,4.58441,-0.42161,0,4.60303,-0.99826,0,4.53881],
// 4 16 -0.65607 0 1.04642 -0.49609 0 1.04642 -0.99826 0 4.53881 -1.49112 0 4.34634
  [4,16,-0.65607,0,1.04642,-0.49609,0,1.04642,-0.99826,0,4.53881,-1.49112,0,4.34634],
// 3 16 -2.75025 0 5.92999 -2.06169 0 6.23684 -10 0 10
  [3,16,-2.75025,0,5.92999,-2.06169,0,6.23684,-10,0,10],
// 3 16 -1.9 0 4.02543 -0.65607 0 1.04642 -1.49112 0 4.34634
  [3,16,-1.9,0,4.02543,-0.65607,0,1.04642,-1.49112,0,4.34634],
// 3 16 -1.27167 0 6.42076 -0.38 0 6.48213 -10 0 10
  [3,16,-1.27167,0,6.42076,-0.38,0,6.48213,-10,0,10],
// 3 16 -2.06169 0 6.23684 -1.27167 0 6.42076 -10 0 10
  [3,16,-2.06169,0,6.23684,-1.27167,0,6.42076,-10,0,10],
// 4 16 -10 0 10 -0.38 0 6.48213 -0.23142 0 6.48213 10 0 10
  [4,16,-10,0,10,-0.38,0,6.48213,-0.23142,0,6.48213,10,0,10],
// 3 16 0.55803 0 -6.51919 -0.05054 0 -6.55662 10 0 -10
  [3,16,0.55803,0,-6.51919,-0.05054,0,-6.55662,10,0,-10],
// 4 16 0.46341 0 -4.47726 0.51642 0 -0.79069 -0.25042 0 -0.73483 0.08132 0 -4.54053
  [4,16,0.46341,0,-4.47726,0.51642,0,-0.79069,-0.25042,0,-0.73483,0.08132,0,-4.54053],
// 3 16 1.70373 0 -6.22127 1.14266 0 -6.40747 10 0 -10
  [3,16,1.70373,0,-6.22127,1.14266,0,-6.40747,10,0,-10],
// 4 16 0.46341 0 -4.47726 0.87305 0 -4.37181 1.36021 0 -4.03285 1.87929 0 -2.12867
  [4,16,0.46341,0,-4.47726,0.87305,0,-4.37181,1.36021,0,-4.03285,1.87929,0,-2.12867],
// 3 16 0.55803 0 -6.51919 10 0 -10 1.14266 0 -6.40747
  [3,16,0.55803,0,-6.51919,10,0,-10,1.14266,0,-6.40747],
// 4 16 0.51642 0 -0.79069 0.46341 0 -4.47726 1.87929 0 -2.12867 1.11264 0 -0.95789
  [4,16,0.51642,0,-0.79069,0.46341,0,-4.47726,1.87929,0,-2.12867,1.11264,0,-0.95789],
// 4 16 1.53843 0 -1.23662 1.11264 0 -0.95789 1.87929 0 -2.12867 1.79398 0 -1.62688
  [4,16,1.53843,0,-1.23662,1.11264,0,-0.95789,1.87929,0,-2.12867,1.79398,0,-1.62688],
// 4 16 1.87929 0 -2.12867 1.36021 0 -4.03285 1.7081 0 -3.63385 1.91691 0 -3.175
  [4,16,1.87929,0,-2.12867,1.36021,0,-4.03285,1.7081,0,-3.63385,1.91691,0,-3.175],
// 4 16 1.9741 0 -2.40075 1.94427 0 -2.2668 1.87929 0 -2.12867 1.98645 0 -2.65649
  [4,16,1.9741,0,-2.40075,1.94427,0,-2.2668,1.87929,0,-2.12867,1.98645,0,-2.65649],
// 3 16 1.98645 0 -2.65649 1.87929 0 -2.12867 1.91691 0 -3.175
  [3,16,1.98645,0,-2.65649,1.87929,0,-2.12867,1.91691,0,-3.175],
// 3 16 2.75443 0 -5.62505 2.24086 0 -5.9604 10 0 -10
  [3,16,2.75443,0,-5.62505,2.24086,0,-5.9604,10,0,-10],
// 3 16 3.53723 0 -4.70032 3.18611 0 -5.19109 10 0 -10
  [3,16,3.53723,0,-4.70032,3.18611,0,-5.19109,10,0,-10],
// 3 16 2.75443 0 -5.62505 10 0 -10 3.18611 0 -5.19109
  [3,16,2.75443,0,-5.62505,10,0,-10,3.18611,0,-5.19109],
// 3 16 3.8076 0 -4.15274 10 0 -10 3.9976 0 -3.54835
  [3,16,3.8076,0,-4.15274,10,0,-10,3.9976,0,-3.54835],
// 3 16 10 0 -10 3.8076 0 -4.15274 3.53723 0 -4.70032
  [3,16,10,0,-10,3.8076,0,-4.15274,3.53723,0,-4.70032],
// 3 16 4.10704 0 -2.88734 3.9976 0 -3.54835 10 0 -10
  [3,16,4.10704,0,-2.88734,3.9976,0,-3.54835,10,0,-10],
// 3 16 10 0 -10 4.1439 0 -2.59455 4.10704 0 -2.88734
  [3,16,10,0,-10,4.1439,0,-2.59455,4.10704,0,-2.88734],
// 3 16 2.24086 0 -5.9604 1.70373 0 -6.22127 10 0 -10
  [3,16,2.24086,0,-5.9604,1.70373,0,-6.22127,10,0,-10],
// 3 16 2.58894 0 0.27939 3.15324 0 -0.13291 3.00238 0 0.49067
  [3,16,2.58894,0,0.27939,3.15324,0,-0.13291,3.00238,0,0.49067],
// 3 16 4.15625 0 -2.31012 4.1439 0 -2.59455 10 0 -10
  [3,16,4.15625,0,-2.31012,4.1439,0,-2.59455,10,0,-10],
// 4 16 3.77473 0 1.5598 3.90545 0 -1.11578 4.09355 0 -1.68654 3.87638 0 2.0614
  [4,16,3.77473,0,1.5598,3.90545,0,-1.11578,4.09355,0,-1.68654,3.87638,0,2.0614],
// 4 16 3.59195 0 -0.59803 3.90545 0 -1.11578 3.59518 0 1.13078 3.33773 0 0.77434
  [4,16,3.59195,0,-0.59803,3.90545,0,-1.11578,3.59518,0,1.13078,3.33773,0,0.77434],
// 4 16 4.09355 0 -1.68654 4.15625 0 -2.31012 10 0 -10 10 0 10
  [4,16,4.09355,0,-1.68654,4.15625,0,-2.31012,10,0,-10,10,0,10],
// 4 16 3.15324 0 -0.13291 3.59195 0 -0.59803 3.33773 0 0.77434 3.00238 0 0.49067
  [4,16,3.15324,0,-0.13291,3.59195,0,-0.59803,3.33773,0,0.77434,3.00238,0,0.49067],
// 4 16 0.20976 0 1.09164 0.78717 0 1.22749 1.79018 0 3.01406 0.29811 0 4.52874
  [4,16,0.20976,0,1.09164,0.78717,0,1.22749,1.79018,0,3.01406,0.29811,0,4.52874],
// 4 16 1.81393 0 2.67567 0.78717 0 1.22749 1.23633 0 1.45378 1.74971 0 2.17787
  [4,16,1.81393,0,2.67567,0.78717,0,1.22749,1.23633,0,1.45378,1.74971,0,2.17787],
// 3 16 1.55724 0 1.77051 1.74971 0 2.17787 1.23633 0 1.45378
  [3,16,1.55724,0,1.77051,1.74971,0,2.17787,1.23633,0,1.45378],
// 4 16 0.69046 0 4.43583 1.79018 0 3.01406 1.71855 0 3.39254 1.26103 0 4.16565
  [4,16,0.69046,0,4.43583,1.79018,0,3.01406,1.71855,0,3.39254,1.26103,0,4.16565],
// 3 16 1.79018 0 3.01406 0.78717 0 1.22749 1.81393 0 2.67567
  [3,16,1.79018,0,3.01406,0.78717,0,1.22749,1.81393,0,2.67567],
// 4 16 1.26103 0 4.16565 1.71855 0 3.39254 1.59942 0 3.8113 1.46737 0 4.00871
  [4,16,1.26103,0,4.16565,1.71855,0,3.39254,1.59942,0,3.8113,1.46737,0,4.00871],
// 4 16 0.20976 0 1.09164 0.29811 0 4.52874 -0.07258 0 4.58441 -0.49609 0 1.04642
  [4,16,0.20976,0,1.09164,0.29811,0,4.52874,-0.07258,0,4.58441,-0.49609,0,1.04642],
// 3 16 -0.23142 0 6.48213 0.61332 0 6.4314 10 0 10
  [3,16,-0.23142,0,6.48213,0.61332,0,6.4314,10,0,10],
// 3 16 1.10447 0 4.30587 0.69046 0 4.43583 1.26103 0 4.16565
  [3,16,1.10447,0,4.30587,0.69046,0,4.43583,1.26103,0,4.16565],
// 3 16 0.69046 0 4.43583 0.29811 0 4.52874 1.79018 0 3.01406
  [3,16,0.69046,0,4.43583,0.29811,0,4.52874,1.79018,0,3.01406],
// 3 16 0.61332 0 6.4314 1.37047 0 6.2794 10 0 10
  [3,16,0.61332,0,6.4314,1.37047,0,6.2794,10,0,10],
// 4 16 10 0 10 4.00121 0 2.66009 3.95447 0 2.3616 4.09355 0 -1.68654
  [4,16,10,0,10,4.00121,0,2.66009,3.95447,0,2.3616,4.09355,0,-1.68654],
// 3 16 3.95447 0 2.3616 3.87638 0 2.0614 4.09355 0 -1.68654
  [3,16,3.95447,0,2.3616,3.87638,0,2.0614,4.09355,0,-1.68654],
// 3 16 3.90545 0 -1.11578 3.77473 0 1.5598 3.59518 0 1.13078
  [3,16,3.90545,0,-1.11578,3.77473,0,1.5598,3.59518,0,1.13078],
// 3 16 3.11695 0 5.21445 3.52393 0 4.6568 10 0 10
  [3,16,3.11695,0,5.21445,3.52393,0,4.6568,10,0,10],
// 3 16 2.04022 0 6.02575 2.62238 0 5.67083 10 0 10
  [3,16,2.04022,0,6.02575,2.62238,0,5.67083,10,0,10],
// 3 16 3.11695 0 5.21445 10 0 10 2.62238 0 5.67083
  [3,16,3.11695,0,5.21445,10,0,10,2.62238,0,5.67083],
// 3 16 3.99741 0 3.2983 4.01679 0 2.95687 10 0 10
  [3,16,3.99741,0,3.2983,4.01679,0,2.95687,10,0,10],
// 3 16 3.84351 0 3.9975 3.93965 0 3.64524 10 0 10
  [3,16,3.84351,0,3.9975,3.93965,0,3.64524,10,0,10],
// 3 16 10 0 10 3.93965 0 3.64524 3.99741 0 3.2983
  [3,16,10,0,10,3.93965,0,3.64524,3.99741,0,3.2983],
// 3 16 3.84351 0 3.9975 10 0 10 3.52393 0 4.6568
  [3,16,3.84351,0,3.9975,10,0,10,3.52393,0,4.6568],
// 3 16 4.01679 0 2.95687 4.00121 0 2.66009 10 0 10
  [3,16,4.01679,0,2.95687,4.00121,0,2.66009,10,0,10],
// 3 16 2.04022 0 6.02575 10 0 10 1.37047 0 6.2794
  [3,16,2.04022,0,6.02575,10,0,10,1.37047,0,6.2794],
// 0
];
makepoly(ldraw_lib__3070bp03(), line=0.2);
